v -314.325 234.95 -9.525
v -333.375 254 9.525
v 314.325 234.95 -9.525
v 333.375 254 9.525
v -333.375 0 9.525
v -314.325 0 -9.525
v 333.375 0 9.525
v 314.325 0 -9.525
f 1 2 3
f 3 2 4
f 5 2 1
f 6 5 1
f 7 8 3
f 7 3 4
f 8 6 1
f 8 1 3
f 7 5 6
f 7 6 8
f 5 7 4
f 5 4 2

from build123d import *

# Parameters (mm, degrees)
F1_DEPTH = 254
F2_SIZE  = 19.04999


# Not quite as in the source:
# - a fillet or chamfer is up to 0.001 mm smaller than in the source, because OpenCascade refuses the exact size


with BuildPart() as f1:
    # F0 (on Front) → F1 (new body)
    with BuildSketch(Plane.XZ):
        Polygon((333.375, 9.525), (-333.375, 9.525), (-314.325, -9.525), (314.325, -9.525), align=None)
    extrude(amount=-F1_DEPTH)

    # F2 (size 19.05 in the source; OpenCascade refuses exactly that, so slightly less here)
    f2_edges = [f1.edges().sort_by_distance(p)[0] for p in [
        (0, 254, -9.525),
    ]]
    chamfer(f2_edges, length=F2_SIZE)


solid = f1.part
